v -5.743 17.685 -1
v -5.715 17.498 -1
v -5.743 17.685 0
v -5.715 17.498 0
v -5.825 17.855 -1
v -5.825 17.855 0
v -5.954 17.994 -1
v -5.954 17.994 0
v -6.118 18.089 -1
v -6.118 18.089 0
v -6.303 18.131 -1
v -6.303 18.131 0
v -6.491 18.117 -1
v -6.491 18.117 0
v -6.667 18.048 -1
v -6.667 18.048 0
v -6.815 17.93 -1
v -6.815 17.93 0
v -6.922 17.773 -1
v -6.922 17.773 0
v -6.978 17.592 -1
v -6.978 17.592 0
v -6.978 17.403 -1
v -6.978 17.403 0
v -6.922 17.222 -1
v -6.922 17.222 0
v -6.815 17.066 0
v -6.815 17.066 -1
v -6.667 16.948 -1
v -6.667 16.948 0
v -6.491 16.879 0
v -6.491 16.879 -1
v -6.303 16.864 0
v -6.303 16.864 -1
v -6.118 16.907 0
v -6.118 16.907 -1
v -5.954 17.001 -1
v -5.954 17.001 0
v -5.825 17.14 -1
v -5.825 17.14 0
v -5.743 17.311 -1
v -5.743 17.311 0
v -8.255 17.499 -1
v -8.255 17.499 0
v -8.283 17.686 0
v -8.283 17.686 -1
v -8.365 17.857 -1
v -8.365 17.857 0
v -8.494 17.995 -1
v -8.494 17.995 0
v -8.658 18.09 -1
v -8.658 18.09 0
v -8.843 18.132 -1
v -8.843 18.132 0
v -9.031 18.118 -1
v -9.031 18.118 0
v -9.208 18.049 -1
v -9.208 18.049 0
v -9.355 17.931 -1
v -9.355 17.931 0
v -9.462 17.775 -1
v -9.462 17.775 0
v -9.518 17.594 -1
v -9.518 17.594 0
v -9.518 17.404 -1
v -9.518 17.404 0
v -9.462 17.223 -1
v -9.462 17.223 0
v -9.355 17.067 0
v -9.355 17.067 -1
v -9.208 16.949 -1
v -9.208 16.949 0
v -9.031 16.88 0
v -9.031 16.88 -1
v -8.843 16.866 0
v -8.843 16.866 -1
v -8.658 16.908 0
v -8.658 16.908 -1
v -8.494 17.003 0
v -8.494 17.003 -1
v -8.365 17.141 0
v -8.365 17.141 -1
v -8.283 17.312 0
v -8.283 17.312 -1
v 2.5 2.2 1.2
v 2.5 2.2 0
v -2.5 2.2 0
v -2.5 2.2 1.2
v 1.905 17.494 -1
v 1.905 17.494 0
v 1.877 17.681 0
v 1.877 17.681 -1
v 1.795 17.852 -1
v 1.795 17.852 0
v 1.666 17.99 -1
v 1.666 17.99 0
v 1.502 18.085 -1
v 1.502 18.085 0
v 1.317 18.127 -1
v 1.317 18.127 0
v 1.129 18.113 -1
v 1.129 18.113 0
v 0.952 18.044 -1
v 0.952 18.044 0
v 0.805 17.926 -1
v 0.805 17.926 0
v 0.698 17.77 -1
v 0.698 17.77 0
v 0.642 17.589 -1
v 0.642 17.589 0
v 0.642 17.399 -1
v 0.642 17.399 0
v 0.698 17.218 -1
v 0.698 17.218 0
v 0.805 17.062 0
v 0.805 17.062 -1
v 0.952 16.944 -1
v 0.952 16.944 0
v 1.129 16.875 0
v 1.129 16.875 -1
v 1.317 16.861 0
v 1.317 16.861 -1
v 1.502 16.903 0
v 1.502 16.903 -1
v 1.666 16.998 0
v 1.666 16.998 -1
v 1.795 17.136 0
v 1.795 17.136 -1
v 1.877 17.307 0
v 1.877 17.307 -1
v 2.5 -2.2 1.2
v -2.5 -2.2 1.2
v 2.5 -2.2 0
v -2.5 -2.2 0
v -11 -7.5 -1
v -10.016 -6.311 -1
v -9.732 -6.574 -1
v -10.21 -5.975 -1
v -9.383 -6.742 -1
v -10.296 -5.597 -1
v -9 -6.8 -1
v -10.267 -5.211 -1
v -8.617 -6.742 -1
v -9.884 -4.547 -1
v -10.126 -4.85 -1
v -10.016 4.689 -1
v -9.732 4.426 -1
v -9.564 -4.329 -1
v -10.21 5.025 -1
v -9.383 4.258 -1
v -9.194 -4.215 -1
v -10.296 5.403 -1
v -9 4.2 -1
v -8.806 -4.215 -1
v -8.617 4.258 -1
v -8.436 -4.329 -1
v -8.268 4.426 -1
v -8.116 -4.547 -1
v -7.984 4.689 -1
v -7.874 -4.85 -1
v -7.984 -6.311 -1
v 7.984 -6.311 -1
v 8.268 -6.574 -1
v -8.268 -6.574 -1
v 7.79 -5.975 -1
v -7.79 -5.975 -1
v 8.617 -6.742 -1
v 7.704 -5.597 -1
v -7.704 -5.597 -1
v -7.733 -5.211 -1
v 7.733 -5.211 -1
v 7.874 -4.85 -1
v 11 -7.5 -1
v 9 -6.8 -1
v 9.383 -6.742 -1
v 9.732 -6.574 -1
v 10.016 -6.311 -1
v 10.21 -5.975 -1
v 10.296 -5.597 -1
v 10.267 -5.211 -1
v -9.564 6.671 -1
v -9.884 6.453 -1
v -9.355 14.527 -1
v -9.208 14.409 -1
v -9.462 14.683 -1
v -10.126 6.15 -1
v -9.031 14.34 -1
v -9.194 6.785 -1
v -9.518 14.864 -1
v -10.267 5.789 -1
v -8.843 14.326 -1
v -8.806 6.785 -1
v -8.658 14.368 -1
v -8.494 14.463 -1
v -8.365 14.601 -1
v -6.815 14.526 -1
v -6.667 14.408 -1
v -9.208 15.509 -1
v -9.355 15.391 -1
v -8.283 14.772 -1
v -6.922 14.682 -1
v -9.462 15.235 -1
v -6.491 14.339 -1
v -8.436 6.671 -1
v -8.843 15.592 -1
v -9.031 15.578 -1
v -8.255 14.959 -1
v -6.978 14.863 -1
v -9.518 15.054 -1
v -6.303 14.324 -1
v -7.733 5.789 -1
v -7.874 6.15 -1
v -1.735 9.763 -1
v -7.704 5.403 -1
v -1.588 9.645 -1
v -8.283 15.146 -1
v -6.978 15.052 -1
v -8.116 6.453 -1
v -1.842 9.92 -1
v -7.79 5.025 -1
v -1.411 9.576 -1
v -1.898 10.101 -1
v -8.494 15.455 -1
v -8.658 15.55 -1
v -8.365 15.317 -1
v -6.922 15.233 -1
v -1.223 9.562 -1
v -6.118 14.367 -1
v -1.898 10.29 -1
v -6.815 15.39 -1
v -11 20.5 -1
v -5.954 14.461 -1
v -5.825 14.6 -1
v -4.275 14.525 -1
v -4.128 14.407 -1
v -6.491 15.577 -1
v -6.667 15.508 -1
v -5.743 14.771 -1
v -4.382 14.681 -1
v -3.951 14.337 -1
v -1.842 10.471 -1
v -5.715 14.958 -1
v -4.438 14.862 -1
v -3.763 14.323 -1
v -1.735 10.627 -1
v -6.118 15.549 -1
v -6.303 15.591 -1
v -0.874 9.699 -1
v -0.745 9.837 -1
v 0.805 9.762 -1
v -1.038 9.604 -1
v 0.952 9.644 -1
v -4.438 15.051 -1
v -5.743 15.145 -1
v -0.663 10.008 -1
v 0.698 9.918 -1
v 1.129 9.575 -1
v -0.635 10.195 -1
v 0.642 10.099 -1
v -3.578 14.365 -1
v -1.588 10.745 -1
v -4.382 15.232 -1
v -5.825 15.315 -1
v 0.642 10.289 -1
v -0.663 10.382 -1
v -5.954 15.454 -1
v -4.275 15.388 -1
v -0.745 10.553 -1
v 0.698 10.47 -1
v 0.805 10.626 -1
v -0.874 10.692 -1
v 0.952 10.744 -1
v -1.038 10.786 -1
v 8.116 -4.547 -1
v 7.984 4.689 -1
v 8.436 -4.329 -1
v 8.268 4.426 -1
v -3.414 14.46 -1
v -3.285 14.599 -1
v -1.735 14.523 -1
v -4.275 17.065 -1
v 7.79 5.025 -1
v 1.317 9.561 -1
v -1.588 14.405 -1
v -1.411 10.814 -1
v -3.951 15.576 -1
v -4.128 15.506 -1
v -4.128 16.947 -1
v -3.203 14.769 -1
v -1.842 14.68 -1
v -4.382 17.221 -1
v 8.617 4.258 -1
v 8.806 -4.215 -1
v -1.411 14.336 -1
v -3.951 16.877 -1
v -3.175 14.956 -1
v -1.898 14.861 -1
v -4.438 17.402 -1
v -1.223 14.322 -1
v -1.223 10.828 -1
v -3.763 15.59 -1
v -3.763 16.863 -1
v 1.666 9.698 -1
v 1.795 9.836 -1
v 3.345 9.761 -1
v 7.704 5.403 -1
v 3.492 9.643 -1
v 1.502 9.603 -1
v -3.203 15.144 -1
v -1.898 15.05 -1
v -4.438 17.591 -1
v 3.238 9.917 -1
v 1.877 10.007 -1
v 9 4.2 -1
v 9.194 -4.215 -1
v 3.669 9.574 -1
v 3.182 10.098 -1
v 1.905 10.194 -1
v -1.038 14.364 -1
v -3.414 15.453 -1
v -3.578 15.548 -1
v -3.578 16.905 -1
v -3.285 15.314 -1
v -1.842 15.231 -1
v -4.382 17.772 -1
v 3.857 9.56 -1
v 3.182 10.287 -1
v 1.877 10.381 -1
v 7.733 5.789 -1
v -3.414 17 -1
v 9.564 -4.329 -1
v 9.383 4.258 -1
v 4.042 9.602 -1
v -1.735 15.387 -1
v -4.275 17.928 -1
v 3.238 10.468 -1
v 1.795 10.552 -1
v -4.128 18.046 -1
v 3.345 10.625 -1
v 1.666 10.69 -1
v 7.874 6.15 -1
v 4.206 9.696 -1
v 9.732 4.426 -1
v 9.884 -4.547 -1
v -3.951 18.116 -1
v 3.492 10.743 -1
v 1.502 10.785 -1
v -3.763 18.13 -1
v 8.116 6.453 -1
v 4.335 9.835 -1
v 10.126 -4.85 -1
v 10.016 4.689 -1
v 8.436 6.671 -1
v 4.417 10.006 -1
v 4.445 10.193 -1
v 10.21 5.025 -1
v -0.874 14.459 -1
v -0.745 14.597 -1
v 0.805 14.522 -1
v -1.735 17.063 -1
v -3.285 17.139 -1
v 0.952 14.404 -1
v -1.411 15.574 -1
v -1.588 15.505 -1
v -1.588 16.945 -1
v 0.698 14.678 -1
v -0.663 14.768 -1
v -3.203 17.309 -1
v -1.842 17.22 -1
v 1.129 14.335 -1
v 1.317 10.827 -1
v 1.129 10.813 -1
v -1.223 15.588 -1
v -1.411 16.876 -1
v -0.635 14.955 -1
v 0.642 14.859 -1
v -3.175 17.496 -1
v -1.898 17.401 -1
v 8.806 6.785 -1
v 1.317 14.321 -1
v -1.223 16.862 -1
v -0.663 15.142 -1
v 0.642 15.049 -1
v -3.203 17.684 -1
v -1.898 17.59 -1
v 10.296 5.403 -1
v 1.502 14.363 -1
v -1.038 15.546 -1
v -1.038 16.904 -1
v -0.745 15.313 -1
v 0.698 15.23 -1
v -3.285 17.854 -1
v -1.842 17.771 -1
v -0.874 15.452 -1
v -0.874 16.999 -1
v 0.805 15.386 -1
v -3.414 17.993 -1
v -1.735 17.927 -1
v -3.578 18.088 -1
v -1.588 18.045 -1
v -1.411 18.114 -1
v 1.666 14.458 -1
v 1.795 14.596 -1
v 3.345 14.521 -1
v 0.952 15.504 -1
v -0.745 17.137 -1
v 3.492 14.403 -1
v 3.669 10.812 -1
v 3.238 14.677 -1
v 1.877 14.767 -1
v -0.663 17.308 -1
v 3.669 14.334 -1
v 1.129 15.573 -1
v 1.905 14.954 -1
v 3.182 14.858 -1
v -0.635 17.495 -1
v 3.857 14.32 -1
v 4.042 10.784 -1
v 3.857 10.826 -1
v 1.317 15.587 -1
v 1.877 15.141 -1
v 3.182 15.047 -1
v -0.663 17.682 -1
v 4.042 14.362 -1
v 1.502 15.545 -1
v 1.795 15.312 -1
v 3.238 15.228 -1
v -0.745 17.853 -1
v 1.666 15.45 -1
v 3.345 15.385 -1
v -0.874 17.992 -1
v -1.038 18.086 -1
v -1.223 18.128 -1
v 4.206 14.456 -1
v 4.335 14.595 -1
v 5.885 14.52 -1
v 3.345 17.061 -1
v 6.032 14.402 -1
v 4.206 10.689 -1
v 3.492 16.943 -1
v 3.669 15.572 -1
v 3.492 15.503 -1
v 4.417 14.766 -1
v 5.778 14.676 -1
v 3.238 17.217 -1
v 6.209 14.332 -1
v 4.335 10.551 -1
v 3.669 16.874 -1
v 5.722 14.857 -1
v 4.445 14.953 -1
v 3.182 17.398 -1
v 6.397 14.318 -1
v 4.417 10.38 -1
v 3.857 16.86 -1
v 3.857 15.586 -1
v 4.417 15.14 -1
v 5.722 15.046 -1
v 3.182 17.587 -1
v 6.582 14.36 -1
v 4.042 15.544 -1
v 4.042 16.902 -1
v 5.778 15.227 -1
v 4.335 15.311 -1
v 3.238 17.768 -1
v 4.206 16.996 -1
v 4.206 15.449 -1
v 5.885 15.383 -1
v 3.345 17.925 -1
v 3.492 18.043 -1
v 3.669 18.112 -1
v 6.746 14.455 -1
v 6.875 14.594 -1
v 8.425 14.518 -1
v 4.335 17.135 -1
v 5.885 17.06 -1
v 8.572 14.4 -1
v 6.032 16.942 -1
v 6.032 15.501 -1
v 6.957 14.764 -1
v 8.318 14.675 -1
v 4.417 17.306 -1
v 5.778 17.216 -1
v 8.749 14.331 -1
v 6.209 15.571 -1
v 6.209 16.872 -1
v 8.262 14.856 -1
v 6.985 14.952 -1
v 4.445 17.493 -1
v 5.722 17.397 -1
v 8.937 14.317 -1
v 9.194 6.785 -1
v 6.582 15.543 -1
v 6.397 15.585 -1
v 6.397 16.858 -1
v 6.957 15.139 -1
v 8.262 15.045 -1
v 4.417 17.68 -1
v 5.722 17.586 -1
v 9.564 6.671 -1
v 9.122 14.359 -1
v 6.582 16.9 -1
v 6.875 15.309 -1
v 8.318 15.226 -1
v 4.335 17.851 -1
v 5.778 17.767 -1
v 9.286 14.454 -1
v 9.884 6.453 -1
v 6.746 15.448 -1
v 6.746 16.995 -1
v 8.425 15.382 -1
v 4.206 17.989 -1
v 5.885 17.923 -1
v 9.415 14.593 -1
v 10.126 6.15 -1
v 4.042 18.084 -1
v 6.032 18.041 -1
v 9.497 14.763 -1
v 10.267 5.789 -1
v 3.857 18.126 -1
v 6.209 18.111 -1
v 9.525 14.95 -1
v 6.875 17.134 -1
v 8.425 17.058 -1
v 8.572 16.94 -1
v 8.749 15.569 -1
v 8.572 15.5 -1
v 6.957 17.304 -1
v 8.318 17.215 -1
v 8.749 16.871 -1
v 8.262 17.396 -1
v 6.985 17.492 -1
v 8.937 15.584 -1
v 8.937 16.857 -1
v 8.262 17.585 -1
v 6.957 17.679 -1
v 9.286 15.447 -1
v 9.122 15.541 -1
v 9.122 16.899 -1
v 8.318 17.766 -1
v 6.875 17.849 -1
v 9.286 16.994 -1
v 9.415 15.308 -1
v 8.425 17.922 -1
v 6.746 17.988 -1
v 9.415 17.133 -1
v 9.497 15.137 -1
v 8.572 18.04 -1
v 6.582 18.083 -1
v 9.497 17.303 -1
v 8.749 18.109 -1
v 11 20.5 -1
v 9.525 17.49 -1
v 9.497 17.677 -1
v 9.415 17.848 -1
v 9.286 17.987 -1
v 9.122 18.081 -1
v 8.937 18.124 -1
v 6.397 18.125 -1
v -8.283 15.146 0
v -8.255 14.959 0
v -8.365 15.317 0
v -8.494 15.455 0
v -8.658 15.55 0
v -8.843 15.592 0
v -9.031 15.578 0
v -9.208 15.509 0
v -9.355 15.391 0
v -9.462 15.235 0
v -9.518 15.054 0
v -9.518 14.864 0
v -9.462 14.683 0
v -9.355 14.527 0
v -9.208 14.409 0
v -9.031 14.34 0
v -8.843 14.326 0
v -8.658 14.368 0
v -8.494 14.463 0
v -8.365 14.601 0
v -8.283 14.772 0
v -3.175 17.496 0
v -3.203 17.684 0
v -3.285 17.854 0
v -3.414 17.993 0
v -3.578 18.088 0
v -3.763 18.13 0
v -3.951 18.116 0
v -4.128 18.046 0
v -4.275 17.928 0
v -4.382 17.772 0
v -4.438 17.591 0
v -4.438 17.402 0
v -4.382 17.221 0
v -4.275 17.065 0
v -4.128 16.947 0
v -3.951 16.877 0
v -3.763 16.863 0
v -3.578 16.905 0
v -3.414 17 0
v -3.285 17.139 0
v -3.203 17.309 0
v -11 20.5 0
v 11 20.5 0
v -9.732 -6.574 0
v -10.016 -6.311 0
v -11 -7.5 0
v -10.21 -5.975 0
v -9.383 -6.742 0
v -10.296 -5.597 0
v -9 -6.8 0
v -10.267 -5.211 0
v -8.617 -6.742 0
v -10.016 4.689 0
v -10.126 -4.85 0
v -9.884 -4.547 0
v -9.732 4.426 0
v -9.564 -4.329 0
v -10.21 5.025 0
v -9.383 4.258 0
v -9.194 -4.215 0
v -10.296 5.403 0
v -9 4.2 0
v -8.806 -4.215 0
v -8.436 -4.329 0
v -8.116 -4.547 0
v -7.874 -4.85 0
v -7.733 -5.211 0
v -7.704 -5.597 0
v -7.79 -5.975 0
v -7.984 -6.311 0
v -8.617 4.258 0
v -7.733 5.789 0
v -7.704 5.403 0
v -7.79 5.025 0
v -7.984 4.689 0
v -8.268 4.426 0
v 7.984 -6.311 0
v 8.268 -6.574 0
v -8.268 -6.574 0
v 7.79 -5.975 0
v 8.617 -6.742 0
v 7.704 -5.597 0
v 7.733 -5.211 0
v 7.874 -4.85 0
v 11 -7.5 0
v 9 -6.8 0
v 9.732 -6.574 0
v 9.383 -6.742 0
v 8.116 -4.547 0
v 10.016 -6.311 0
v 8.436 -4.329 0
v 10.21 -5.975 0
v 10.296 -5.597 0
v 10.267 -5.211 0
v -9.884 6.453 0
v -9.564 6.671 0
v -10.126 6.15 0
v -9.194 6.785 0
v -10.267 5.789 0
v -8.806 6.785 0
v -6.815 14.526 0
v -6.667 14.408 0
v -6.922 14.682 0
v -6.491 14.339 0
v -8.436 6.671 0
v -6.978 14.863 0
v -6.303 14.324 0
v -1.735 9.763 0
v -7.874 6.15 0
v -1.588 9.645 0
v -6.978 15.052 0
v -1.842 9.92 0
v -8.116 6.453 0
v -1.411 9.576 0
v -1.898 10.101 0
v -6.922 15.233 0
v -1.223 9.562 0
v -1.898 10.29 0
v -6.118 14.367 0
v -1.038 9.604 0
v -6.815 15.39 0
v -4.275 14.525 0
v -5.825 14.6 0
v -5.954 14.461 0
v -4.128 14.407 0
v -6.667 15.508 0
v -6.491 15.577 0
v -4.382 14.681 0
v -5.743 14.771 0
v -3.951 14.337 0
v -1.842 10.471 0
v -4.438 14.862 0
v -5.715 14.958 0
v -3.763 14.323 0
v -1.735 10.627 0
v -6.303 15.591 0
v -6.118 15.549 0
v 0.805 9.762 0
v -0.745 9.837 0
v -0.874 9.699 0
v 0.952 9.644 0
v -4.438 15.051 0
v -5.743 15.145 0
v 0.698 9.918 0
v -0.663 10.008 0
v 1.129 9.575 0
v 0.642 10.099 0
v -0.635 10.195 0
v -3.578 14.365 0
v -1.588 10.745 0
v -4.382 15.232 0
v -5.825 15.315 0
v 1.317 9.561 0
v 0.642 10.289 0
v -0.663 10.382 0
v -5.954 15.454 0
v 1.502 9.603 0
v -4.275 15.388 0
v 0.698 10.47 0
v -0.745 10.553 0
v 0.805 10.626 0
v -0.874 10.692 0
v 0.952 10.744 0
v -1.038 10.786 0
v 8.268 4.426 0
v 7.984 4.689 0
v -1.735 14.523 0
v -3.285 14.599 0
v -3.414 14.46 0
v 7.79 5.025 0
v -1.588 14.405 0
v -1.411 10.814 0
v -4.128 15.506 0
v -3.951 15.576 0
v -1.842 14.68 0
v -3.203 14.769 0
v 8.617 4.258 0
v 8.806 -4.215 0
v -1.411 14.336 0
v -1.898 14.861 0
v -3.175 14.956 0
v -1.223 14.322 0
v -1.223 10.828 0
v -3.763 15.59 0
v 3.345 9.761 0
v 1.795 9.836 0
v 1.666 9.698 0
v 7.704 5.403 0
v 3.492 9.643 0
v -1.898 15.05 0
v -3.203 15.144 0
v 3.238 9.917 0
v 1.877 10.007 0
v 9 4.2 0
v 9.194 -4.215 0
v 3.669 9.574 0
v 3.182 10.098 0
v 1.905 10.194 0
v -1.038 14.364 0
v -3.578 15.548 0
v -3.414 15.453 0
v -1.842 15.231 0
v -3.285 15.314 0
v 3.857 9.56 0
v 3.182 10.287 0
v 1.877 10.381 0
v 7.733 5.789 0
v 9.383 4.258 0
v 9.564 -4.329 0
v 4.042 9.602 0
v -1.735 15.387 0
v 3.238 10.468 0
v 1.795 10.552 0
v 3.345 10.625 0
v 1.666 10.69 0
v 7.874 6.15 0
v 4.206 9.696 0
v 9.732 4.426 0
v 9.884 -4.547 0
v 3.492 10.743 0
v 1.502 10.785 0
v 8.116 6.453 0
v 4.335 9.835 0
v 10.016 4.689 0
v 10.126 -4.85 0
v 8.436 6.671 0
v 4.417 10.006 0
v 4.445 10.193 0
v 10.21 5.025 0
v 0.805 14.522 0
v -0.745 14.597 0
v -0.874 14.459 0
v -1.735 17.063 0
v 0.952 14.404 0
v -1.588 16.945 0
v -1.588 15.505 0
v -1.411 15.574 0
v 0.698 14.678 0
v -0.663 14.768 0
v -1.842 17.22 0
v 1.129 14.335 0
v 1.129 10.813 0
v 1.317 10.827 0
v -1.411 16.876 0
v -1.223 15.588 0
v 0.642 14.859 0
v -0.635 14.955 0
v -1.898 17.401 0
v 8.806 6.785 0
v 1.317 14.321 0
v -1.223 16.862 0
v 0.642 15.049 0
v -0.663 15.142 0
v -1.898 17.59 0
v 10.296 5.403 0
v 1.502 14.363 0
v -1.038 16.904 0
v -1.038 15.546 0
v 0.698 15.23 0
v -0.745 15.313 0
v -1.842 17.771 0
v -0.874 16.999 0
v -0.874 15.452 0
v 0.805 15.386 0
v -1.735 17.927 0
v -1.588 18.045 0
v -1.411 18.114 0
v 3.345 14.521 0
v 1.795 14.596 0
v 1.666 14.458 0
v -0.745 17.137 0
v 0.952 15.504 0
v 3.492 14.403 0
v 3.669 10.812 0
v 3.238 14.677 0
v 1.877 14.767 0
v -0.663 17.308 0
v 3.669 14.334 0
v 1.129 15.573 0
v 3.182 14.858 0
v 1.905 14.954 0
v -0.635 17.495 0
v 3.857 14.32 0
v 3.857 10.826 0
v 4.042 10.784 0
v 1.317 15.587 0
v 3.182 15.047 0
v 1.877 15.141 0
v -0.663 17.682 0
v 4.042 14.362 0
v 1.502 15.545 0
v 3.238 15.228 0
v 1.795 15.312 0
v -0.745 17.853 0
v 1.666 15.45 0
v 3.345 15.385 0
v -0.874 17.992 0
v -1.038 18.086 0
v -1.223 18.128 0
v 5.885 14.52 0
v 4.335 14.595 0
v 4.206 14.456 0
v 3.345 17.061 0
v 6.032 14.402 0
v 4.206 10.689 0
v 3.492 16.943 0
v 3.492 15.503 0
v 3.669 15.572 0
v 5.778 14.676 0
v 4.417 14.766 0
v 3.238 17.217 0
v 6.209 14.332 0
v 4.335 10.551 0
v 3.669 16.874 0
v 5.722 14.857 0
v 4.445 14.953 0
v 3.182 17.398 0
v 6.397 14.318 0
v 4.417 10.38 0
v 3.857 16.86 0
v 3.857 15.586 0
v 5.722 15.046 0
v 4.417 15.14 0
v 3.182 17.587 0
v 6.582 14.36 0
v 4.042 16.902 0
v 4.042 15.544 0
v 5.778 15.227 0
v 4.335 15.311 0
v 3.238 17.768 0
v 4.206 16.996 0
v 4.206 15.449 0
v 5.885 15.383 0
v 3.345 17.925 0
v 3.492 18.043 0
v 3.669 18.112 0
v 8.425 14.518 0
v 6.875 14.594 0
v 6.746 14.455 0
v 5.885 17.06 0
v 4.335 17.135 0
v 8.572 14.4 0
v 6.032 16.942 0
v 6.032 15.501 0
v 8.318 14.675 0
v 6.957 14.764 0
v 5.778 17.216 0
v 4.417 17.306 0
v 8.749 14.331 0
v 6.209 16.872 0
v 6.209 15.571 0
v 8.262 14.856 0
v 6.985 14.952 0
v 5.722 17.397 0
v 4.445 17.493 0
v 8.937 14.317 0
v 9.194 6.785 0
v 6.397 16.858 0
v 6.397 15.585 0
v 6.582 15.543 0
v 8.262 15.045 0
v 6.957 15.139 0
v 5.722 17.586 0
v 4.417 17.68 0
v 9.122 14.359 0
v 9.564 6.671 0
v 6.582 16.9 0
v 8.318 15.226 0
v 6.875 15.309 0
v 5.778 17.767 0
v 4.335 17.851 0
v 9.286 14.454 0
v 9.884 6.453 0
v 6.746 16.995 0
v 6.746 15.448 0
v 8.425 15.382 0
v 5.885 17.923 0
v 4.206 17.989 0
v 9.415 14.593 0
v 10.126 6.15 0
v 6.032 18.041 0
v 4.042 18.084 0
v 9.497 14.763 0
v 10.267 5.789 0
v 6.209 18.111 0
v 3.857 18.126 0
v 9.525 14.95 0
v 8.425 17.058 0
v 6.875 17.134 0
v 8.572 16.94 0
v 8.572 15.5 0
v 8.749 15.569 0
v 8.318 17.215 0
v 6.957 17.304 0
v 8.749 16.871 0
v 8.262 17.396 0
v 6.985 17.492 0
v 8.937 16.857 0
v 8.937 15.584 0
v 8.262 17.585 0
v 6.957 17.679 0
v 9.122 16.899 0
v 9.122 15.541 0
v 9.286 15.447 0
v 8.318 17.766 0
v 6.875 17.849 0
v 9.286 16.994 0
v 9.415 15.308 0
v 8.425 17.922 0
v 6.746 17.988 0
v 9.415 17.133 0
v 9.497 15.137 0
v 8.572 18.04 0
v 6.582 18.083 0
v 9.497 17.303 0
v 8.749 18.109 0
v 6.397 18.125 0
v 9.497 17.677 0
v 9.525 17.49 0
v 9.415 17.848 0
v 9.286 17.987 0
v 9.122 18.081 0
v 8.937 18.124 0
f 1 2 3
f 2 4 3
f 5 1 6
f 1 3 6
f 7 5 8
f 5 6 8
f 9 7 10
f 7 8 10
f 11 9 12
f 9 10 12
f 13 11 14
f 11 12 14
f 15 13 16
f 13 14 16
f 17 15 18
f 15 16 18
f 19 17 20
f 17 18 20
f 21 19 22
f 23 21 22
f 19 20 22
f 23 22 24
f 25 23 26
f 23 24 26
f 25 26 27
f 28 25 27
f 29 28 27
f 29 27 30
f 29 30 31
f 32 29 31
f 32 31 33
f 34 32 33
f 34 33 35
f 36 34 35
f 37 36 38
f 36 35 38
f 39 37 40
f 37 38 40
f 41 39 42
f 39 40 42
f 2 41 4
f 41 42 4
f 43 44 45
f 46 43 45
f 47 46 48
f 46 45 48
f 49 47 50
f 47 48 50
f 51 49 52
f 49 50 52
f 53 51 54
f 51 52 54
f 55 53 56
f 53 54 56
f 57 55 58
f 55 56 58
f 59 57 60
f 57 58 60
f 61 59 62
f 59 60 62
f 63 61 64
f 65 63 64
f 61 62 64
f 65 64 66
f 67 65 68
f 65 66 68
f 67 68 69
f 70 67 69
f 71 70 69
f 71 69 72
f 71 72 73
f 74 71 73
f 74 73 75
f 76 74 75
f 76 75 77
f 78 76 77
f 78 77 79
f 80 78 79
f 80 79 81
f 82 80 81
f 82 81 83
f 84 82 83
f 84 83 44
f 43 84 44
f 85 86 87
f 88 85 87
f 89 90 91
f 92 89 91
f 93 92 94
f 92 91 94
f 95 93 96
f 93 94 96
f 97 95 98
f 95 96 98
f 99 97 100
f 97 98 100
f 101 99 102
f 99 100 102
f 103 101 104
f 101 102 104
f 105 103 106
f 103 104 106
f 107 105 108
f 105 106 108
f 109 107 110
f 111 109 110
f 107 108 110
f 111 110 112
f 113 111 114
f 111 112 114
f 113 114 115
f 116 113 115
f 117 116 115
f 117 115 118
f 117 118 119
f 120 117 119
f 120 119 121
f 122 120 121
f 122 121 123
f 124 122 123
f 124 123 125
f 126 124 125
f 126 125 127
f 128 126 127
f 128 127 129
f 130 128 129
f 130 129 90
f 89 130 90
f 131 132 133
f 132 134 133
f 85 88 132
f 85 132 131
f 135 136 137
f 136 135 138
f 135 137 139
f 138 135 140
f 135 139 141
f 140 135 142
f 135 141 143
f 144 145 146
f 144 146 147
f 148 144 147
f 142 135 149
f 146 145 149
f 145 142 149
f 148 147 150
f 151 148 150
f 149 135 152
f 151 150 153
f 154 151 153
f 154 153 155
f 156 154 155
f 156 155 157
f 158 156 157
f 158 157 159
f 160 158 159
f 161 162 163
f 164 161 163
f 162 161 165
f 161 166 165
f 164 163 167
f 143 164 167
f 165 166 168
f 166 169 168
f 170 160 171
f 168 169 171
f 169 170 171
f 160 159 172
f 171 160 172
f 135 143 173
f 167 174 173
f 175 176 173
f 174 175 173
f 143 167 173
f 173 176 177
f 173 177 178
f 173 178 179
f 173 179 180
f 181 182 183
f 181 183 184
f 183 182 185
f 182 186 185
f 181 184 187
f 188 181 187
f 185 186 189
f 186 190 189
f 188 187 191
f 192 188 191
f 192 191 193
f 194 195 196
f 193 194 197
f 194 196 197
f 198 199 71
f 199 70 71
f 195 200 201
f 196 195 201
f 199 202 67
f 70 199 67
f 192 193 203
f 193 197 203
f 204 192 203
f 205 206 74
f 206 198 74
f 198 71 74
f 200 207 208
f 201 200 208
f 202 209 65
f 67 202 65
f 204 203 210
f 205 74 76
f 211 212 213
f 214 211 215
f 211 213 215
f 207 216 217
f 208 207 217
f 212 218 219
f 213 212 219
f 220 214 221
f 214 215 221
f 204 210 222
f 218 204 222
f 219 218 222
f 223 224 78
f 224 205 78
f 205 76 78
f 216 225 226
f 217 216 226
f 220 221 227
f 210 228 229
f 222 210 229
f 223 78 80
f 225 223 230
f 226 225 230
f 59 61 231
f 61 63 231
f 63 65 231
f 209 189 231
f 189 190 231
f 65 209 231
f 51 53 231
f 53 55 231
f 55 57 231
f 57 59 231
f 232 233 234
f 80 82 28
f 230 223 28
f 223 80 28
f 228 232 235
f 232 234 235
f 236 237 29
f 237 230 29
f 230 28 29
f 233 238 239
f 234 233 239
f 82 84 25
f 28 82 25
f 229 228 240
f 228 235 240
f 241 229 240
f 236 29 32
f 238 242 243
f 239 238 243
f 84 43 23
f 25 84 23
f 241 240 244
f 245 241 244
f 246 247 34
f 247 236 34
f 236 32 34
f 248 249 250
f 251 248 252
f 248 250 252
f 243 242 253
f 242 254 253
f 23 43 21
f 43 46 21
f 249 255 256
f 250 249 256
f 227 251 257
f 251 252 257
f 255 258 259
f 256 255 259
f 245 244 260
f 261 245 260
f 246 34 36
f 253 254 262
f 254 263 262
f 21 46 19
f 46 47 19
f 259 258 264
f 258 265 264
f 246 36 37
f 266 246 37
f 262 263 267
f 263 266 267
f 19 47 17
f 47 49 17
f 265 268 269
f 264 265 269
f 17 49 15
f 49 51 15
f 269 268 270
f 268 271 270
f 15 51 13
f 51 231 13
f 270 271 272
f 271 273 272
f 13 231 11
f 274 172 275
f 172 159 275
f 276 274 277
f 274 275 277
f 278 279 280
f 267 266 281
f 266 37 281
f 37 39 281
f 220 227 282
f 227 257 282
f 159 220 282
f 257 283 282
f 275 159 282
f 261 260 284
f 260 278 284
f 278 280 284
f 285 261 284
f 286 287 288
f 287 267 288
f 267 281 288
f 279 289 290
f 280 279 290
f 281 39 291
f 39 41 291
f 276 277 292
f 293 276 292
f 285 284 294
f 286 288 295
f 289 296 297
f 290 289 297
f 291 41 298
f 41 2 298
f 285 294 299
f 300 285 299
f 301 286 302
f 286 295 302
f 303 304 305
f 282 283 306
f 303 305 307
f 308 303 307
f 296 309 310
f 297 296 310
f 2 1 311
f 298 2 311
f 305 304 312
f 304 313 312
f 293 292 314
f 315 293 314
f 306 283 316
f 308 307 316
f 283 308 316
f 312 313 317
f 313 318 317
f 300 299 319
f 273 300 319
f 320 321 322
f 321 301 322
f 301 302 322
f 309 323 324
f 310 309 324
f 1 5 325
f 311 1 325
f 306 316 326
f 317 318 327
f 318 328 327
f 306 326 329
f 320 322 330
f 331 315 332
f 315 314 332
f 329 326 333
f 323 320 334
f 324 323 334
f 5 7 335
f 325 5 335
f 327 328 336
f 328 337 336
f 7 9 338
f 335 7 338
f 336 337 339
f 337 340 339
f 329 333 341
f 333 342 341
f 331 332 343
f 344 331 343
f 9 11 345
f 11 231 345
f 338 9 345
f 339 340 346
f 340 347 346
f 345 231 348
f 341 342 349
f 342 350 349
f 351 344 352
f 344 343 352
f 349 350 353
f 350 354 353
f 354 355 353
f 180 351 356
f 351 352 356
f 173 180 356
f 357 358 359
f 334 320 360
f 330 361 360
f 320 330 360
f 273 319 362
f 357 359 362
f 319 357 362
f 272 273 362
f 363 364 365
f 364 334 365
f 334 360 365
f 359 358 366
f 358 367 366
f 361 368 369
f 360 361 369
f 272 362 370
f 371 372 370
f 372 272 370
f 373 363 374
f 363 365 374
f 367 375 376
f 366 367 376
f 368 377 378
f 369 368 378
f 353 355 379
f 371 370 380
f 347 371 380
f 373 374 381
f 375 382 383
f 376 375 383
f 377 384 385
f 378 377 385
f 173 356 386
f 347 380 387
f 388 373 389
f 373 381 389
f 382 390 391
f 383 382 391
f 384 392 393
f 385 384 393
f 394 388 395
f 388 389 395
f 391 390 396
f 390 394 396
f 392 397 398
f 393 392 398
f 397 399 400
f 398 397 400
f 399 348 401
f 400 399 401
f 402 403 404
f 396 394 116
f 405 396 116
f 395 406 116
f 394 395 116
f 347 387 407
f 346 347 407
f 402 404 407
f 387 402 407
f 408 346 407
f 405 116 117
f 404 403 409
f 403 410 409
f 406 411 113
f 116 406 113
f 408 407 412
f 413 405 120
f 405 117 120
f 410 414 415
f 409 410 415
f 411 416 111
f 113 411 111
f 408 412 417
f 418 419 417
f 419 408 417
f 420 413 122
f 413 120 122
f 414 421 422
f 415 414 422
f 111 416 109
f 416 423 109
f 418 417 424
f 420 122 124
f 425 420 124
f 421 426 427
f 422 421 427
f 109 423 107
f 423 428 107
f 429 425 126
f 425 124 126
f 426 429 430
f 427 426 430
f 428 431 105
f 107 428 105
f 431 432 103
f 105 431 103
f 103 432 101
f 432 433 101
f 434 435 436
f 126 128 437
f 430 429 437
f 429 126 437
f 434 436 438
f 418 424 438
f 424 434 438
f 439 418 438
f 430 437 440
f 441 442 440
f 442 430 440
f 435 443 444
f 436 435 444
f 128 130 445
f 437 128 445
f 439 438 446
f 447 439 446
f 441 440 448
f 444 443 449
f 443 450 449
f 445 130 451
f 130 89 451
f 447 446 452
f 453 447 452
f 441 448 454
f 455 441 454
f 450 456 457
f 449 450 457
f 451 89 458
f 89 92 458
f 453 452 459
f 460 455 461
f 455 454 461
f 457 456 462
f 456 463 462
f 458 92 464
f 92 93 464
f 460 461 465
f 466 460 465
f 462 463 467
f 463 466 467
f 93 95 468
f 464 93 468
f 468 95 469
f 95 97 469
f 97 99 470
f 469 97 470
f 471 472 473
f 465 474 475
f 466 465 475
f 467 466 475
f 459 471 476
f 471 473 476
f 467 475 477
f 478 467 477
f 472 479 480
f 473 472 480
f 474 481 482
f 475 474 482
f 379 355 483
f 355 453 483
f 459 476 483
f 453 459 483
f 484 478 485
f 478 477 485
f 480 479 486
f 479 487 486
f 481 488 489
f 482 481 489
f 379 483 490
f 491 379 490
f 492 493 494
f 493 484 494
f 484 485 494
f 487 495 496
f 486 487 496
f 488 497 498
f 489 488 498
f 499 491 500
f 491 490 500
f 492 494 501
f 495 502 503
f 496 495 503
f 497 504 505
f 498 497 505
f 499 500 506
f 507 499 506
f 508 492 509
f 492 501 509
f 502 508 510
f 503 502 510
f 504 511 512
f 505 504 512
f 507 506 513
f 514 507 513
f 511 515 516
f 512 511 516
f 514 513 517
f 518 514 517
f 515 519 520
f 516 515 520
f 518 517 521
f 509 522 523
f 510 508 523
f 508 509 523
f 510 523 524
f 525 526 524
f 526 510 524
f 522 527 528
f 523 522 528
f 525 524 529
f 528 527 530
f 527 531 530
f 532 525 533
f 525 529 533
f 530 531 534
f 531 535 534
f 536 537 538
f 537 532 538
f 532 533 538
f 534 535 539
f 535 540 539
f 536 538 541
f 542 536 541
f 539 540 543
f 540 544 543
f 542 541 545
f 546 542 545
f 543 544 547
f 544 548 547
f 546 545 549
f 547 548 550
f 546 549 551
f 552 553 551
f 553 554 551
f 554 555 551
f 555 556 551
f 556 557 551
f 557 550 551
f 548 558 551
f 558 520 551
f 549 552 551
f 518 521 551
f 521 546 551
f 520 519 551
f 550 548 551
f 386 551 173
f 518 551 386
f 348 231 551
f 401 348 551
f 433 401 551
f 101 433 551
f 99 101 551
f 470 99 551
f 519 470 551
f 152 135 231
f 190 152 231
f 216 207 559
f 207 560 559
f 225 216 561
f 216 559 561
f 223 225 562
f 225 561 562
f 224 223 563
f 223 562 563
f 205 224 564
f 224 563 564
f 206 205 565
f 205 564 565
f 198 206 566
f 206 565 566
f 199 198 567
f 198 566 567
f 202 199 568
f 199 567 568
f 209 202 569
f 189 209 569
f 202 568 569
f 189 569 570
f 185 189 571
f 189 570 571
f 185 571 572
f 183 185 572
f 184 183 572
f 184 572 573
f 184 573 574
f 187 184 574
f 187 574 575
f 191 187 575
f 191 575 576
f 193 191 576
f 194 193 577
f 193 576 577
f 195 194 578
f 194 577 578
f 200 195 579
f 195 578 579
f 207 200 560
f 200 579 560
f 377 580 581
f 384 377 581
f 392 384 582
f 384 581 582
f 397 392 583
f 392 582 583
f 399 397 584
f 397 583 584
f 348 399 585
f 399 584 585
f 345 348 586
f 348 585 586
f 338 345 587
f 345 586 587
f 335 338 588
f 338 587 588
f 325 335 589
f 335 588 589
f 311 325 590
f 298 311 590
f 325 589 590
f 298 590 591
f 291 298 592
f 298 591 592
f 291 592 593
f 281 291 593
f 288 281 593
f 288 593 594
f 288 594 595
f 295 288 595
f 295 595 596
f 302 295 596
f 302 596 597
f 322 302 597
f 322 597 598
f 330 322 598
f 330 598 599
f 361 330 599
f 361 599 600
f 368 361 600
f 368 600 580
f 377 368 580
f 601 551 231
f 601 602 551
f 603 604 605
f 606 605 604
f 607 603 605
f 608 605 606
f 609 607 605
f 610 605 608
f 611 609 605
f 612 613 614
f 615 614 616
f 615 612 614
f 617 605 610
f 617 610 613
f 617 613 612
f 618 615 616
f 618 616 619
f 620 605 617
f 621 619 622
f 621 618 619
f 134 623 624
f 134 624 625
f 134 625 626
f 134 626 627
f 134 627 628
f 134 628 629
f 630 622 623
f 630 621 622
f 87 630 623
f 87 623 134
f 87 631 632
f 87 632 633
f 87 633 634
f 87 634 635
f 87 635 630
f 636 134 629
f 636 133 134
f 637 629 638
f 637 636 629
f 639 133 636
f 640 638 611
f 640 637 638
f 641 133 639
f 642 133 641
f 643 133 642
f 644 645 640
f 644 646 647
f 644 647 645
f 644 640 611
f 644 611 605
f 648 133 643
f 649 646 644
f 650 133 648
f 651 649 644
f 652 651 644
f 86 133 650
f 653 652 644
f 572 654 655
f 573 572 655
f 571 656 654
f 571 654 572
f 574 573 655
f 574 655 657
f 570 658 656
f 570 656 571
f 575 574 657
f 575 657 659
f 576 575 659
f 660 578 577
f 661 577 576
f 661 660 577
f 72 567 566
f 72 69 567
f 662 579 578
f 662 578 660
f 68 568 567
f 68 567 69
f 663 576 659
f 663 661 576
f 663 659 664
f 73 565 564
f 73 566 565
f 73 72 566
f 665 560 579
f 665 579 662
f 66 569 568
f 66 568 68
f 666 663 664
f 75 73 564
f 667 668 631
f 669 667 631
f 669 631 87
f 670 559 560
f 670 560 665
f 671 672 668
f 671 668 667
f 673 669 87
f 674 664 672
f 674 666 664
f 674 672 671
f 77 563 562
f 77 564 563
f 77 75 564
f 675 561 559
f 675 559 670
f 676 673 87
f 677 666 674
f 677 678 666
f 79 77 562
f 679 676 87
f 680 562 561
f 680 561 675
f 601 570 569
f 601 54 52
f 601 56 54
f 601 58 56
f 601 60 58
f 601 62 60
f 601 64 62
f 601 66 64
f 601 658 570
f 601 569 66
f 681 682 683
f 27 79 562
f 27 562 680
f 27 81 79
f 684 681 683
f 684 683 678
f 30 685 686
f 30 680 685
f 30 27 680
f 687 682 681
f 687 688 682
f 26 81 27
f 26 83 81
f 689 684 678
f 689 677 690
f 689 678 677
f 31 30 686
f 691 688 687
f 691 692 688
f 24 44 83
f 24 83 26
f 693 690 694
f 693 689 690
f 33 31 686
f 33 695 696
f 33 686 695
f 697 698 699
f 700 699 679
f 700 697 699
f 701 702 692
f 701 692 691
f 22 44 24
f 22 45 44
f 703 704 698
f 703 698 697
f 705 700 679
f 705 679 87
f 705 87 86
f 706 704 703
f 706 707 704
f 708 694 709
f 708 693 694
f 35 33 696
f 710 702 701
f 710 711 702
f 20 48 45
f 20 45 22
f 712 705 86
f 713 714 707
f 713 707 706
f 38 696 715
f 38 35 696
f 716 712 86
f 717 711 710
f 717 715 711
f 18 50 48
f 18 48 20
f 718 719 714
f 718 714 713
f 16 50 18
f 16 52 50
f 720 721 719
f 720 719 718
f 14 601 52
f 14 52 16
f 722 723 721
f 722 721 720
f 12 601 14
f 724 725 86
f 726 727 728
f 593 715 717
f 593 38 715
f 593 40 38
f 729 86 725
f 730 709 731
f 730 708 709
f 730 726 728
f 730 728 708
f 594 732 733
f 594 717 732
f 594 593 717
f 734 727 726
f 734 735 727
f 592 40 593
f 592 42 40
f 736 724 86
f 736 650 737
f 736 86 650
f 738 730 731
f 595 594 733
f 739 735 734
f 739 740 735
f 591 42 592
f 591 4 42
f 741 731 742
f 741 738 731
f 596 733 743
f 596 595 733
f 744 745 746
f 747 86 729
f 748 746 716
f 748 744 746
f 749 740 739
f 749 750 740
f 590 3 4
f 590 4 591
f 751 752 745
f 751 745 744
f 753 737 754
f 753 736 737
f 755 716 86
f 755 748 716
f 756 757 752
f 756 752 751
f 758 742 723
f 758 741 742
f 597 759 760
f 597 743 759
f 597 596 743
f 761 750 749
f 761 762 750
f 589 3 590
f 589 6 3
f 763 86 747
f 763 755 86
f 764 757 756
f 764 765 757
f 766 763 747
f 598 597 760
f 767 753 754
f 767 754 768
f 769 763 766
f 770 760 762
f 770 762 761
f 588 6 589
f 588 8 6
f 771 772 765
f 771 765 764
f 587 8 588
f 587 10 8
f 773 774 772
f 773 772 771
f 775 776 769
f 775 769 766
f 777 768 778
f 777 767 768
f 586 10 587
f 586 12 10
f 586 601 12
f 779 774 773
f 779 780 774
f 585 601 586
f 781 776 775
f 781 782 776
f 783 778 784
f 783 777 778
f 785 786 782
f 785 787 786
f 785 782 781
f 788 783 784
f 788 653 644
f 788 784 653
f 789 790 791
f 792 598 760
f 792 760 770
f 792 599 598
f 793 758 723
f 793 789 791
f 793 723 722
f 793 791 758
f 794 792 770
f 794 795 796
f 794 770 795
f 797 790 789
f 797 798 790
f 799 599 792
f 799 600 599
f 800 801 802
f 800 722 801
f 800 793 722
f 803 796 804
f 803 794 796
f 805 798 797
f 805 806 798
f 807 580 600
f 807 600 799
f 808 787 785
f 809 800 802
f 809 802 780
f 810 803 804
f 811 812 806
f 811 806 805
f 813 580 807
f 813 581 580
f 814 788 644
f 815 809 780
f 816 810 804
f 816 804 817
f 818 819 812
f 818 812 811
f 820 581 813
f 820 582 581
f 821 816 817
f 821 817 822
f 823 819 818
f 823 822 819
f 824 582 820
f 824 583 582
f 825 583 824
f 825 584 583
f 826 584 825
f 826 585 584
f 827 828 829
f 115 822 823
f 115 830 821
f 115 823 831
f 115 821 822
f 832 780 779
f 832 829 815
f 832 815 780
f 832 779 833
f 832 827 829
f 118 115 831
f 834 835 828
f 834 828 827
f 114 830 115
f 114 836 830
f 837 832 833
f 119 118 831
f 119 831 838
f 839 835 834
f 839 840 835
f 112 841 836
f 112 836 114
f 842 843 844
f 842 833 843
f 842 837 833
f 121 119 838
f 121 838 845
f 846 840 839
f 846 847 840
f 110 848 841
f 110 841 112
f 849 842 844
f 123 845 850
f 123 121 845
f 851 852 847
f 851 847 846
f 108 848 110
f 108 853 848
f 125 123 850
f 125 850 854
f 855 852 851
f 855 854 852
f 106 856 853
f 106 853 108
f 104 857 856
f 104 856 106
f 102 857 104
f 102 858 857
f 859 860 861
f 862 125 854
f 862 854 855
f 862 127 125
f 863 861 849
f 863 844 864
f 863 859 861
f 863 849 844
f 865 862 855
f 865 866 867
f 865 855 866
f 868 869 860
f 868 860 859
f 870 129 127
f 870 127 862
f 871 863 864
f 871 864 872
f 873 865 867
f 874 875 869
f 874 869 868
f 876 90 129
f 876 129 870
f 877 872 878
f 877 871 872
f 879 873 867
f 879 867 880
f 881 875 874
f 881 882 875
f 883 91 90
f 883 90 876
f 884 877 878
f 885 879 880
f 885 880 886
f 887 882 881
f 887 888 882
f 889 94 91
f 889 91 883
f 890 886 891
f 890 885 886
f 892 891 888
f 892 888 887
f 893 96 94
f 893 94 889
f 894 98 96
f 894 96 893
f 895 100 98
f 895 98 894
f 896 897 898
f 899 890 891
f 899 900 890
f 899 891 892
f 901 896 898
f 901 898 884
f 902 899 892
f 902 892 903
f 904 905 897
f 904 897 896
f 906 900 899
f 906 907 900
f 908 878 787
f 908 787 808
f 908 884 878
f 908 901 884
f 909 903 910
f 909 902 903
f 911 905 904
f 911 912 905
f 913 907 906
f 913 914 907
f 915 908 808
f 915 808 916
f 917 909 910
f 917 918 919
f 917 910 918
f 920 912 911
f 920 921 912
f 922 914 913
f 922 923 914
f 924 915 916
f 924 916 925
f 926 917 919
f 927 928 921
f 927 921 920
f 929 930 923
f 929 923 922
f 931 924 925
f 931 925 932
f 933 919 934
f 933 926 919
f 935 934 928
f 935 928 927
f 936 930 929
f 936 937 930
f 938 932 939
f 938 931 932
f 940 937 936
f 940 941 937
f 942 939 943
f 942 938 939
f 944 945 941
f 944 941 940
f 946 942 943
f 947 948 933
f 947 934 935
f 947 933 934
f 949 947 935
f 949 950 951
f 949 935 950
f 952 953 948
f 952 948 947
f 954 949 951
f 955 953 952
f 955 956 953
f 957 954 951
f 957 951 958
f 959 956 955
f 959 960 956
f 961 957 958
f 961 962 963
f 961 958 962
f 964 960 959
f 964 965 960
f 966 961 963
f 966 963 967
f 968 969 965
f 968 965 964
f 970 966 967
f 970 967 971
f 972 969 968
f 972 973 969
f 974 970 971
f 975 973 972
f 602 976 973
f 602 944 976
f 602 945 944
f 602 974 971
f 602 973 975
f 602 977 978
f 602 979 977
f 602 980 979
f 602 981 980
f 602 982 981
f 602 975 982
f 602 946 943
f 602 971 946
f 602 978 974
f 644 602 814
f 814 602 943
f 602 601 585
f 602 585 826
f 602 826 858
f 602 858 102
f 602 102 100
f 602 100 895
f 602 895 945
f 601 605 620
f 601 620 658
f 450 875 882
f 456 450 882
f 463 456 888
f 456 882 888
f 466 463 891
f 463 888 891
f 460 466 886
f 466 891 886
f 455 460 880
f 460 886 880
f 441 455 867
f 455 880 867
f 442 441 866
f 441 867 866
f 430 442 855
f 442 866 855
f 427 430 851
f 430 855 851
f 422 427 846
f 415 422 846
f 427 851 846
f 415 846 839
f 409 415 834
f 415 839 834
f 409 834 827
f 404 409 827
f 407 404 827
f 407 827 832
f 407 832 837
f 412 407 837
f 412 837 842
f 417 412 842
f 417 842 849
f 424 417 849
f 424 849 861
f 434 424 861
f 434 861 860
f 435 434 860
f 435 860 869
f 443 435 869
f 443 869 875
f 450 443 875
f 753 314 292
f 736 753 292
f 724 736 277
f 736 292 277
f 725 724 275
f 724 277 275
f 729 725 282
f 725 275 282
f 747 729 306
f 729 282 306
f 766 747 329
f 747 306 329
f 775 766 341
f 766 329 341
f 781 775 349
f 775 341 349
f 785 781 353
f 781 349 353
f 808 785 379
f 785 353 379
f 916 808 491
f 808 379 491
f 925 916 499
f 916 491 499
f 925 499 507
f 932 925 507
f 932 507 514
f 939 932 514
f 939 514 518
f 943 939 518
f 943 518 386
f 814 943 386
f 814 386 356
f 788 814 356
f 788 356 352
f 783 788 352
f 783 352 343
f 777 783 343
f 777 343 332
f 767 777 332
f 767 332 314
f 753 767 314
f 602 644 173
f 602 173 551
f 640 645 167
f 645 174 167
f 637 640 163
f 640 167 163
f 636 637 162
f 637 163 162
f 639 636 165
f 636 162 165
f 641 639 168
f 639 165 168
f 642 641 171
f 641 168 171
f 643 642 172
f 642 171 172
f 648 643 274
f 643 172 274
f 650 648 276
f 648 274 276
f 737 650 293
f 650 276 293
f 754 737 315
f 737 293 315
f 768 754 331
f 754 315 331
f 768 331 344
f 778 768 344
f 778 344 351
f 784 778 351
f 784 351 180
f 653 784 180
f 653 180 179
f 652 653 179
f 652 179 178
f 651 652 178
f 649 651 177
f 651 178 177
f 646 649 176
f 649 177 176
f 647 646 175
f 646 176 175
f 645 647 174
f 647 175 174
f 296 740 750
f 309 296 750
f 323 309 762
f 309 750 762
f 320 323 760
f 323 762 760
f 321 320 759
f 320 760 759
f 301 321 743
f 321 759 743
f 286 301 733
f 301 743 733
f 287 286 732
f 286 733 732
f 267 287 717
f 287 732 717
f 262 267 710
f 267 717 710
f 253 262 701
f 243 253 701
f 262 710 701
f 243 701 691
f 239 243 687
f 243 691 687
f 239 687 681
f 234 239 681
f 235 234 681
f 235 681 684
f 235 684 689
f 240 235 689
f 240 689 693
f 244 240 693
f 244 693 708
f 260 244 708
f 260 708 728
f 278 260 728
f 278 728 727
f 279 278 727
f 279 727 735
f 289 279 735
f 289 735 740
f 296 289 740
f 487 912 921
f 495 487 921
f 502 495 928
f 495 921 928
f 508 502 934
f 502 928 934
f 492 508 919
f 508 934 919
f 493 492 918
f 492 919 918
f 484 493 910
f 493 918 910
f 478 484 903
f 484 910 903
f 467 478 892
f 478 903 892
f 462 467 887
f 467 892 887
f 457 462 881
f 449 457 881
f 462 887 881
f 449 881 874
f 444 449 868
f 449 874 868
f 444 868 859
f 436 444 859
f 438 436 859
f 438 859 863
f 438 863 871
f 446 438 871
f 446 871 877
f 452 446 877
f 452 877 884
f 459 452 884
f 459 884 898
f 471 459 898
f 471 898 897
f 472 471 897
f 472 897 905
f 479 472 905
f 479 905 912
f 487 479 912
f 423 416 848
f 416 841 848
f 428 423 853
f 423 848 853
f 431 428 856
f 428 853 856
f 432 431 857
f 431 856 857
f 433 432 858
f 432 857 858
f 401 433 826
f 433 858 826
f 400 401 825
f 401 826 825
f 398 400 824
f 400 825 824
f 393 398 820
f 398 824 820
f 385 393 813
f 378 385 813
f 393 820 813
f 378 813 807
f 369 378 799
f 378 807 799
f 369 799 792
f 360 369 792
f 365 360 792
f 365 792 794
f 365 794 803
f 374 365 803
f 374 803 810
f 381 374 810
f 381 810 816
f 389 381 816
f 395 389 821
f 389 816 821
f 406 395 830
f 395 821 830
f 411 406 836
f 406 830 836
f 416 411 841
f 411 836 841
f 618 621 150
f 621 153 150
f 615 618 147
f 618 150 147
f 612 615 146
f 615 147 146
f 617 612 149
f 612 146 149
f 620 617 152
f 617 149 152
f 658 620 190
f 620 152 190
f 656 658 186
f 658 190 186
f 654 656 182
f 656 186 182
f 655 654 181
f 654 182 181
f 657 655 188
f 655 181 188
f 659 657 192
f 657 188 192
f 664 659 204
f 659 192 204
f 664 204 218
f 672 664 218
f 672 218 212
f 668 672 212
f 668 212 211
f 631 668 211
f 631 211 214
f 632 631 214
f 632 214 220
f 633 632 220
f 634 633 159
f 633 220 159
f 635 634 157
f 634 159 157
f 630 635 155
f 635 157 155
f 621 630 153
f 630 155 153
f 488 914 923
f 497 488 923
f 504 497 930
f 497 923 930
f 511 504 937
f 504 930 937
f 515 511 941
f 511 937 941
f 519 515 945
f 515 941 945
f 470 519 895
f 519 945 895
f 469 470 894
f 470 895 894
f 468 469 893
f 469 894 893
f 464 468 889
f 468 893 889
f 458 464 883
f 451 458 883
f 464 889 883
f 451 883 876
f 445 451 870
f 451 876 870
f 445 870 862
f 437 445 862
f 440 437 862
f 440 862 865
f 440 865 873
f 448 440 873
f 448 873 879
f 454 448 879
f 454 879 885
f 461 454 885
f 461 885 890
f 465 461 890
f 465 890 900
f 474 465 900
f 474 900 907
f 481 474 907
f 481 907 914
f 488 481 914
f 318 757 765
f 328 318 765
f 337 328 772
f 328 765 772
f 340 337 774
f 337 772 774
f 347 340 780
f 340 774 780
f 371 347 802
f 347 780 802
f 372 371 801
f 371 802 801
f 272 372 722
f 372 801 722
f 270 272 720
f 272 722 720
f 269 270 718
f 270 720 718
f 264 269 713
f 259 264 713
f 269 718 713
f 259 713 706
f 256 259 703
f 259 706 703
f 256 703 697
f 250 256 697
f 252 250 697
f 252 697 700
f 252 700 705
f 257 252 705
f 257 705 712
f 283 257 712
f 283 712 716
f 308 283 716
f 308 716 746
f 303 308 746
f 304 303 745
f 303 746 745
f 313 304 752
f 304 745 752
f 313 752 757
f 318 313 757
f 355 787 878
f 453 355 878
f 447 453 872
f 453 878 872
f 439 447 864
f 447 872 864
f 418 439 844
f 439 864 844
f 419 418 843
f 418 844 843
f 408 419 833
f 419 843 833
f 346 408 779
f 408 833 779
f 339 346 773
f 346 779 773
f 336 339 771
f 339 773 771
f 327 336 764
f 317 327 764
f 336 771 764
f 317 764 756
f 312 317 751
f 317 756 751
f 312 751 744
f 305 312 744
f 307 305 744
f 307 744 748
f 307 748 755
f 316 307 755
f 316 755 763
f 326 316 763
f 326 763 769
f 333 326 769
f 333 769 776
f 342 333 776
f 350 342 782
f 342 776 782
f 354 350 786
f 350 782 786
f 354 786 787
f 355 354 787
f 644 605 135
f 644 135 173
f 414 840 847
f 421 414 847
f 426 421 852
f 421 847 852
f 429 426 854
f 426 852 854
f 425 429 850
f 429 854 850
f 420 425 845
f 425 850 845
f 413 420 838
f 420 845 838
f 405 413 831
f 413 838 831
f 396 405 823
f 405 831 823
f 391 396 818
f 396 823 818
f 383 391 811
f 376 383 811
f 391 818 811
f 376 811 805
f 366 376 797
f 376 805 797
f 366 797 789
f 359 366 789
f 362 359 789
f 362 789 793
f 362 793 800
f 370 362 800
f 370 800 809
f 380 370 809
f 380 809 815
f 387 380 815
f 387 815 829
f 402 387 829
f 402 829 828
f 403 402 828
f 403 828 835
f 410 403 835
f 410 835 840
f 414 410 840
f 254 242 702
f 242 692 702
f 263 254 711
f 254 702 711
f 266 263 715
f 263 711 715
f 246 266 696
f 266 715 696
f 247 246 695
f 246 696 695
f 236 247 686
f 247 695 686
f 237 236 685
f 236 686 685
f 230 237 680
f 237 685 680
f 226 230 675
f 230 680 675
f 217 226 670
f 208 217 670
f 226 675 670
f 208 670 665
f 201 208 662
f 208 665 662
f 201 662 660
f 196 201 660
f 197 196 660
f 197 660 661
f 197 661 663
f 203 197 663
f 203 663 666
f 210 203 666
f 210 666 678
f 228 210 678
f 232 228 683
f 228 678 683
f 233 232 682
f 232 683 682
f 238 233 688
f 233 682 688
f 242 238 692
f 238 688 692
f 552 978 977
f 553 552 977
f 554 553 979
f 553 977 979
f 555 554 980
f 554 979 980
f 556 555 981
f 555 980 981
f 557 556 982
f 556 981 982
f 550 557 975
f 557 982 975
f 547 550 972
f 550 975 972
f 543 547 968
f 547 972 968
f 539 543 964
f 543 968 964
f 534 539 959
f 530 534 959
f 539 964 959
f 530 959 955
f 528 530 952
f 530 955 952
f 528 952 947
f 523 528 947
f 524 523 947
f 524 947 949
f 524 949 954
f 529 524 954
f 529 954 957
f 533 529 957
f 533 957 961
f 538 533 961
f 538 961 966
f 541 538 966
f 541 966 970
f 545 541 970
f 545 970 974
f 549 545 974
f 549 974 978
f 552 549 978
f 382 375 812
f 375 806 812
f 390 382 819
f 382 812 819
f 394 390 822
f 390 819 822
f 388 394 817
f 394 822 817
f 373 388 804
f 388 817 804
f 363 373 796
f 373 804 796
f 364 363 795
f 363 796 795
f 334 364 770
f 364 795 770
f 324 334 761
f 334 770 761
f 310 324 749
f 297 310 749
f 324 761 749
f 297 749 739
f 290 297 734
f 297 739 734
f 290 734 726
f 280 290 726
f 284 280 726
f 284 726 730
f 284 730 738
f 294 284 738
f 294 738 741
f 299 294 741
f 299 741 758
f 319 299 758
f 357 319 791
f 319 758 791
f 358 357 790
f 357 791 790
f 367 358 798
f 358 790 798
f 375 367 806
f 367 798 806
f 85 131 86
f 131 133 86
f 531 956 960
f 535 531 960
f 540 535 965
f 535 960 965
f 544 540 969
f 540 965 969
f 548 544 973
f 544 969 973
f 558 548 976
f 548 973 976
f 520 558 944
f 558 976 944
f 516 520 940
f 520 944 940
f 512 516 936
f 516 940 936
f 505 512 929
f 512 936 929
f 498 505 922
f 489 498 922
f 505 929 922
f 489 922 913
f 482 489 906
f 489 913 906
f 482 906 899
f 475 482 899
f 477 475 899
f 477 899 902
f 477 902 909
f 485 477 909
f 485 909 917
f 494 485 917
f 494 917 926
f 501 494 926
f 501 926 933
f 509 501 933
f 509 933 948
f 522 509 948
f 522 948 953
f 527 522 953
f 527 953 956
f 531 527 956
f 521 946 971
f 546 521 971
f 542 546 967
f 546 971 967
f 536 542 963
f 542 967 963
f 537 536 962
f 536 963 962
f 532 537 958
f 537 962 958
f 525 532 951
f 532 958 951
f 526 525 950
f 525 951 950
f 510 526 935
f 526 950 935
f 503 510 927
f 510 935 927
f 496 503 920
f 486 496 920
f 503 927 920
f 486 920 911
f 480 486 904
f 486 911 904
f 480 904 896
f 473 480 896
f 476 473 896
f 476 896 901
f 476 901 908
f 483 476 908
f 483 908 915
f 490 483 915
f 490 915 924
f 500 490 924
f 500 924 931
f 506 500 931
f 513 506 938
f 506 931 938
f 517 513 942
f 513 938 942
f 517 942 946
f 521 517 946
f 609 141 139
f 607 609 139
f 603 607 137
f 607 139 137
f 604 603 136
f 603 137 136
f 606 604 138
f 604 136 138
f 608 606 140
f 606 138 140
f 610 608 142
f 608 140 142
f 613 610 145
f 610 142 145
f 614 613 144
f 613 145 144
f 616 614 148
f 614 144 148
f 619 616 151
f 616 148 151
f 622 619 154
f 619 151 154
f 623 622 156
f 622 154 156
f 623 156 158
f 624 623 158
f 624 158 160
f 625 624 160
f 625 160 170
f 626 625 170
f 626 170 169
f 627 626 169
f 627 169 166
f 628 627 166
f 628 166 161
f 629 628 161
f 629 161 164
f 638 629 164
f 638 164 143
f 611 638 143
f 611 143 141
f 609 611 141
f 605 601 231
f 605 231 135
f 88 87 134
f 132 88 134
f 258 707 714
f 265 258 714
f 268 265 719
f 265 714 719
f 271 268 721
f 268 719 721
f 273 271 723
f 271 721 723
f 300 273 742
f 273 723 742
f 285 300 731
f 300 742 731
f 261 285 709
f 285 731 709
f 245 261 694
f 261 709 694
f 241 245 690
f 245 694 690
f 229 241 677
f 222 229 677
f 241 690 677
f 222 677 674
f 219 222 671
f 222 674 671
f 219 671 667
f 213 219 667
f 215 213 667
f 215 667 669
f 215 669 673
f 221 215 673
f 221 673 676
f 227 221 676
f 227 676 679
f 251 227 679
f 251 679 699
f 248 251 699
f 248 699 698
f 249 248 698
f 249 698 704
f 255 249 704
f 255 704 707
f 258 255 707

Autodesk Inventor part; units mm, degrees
ref_plane "YZ Plane" through (0, 0, 0) normal (1, 0, 0) x (0, 1, 0)
ref_plane "XZ Plane" through (0, 0, 0) normal (0, 1, 0) x (-1, 0, 0)
ref_plane "XY Plane" through (0, 0, 0) normal (0, 0, 1) x (1, 0, 0)
sketch "スケッチ1" plane through (0, 0, 0) normal (0, 0, 1) x (1, 0, 0)
  line L0 (-11, -7.5) -> (11, -7.5)
  line L1 (11, -7.5) -> (11, 20.5)
  line L2 (11, 20.5) -> (-11, 20.5)
  line L3 (-11, 20.5) -> (-11, -7.5)
  line L4 (-11, -7.5) -> (11, 20.5) construction
  line L5 (11, -7.5) -> (-11, 20.5) construction
  line L6 (-9, -5.5) -> (9, -5.5) construction
  line L7 (9, -5.5) -> (9, 5.5) construction
  line L8 (9, 5.5) -> (-9, 5.5) construction
  line L9 (-9, 5.5) -> (-9, -5.5) construction
  line L10 (-9, -5.5) -> (9, 5.5) construction
  line L11 (9, -5.5) -> (-9, 5.5) construction
  point P0 (0, 0)
  point P1 (0, 6.5)
  point P2 (0, 6.5)
  point P3 (0, 0)
  point P4 (0, 0)
  point P5 (0, 0)
  dimension "d0" = 22
  dimension "d1" = 28
  dimension "d2" = 18
  dimension "d3" = 11
  dimension "d4" = 2
extrude "押し出し1" add sketch "スケッチ1" against normal blind 1
sketch "スケッチ2" plane through (0, 0, 0) normal (0, 0, 1) x (1, 0, 0)
  line L0 (-9, -5.5) -> (9, -5.5)
  line L1 (9, -5.5) -> (9, 5.5)
  line L2 (9, 5.5) -> (-9, 5.5)
  line L3 (-9, 5.5) -> (-9, -5.5)
  line L4 (-9, -5.5) -> (9, 5.5) construction
  line L5 (9, -5.5) -> (-9, 5.5) construction
  point P0 (0, 0)
  dimension "d7" = 11
  dimension "d8" = 18
hole "穴1" at (-9, 5.5, 0) at (-9, -5.5, 0) at (9, 5.5, 0) at (9, -5.5, 0) direction (0, 0, -1) diameter 2.6 end through all
sketch "スケッチ3" plane through (0, 0, 0) normal (0, 0, 1) x (1, 0, 0)
  line L0 (-2.5, -2.2) -> (2.5, -2.2)
  line L1 (2.5, -2.2) -> (2.5, 2.2)
  line L2 (2.5, 2.2) -> (-2.5, 2.2)
  line L3 (-2.5, 2.2) -> (-2.5, -2.2)
  line L4 (-2.5, -2.2) -> (2.5, 2.2) construction
  line L5 (2.5, -2.2) -> (-2.5, 2.2) construction
  point P0 (0, 0)
  dimension "d16" = 4.4
  dimension "d17" = 5
extrude "押し出し2" add sketch "スケッチ3" along normal blind 1.2
sketch "スケッチ4" plane through (0, 0, 0) normal (0, 0, 1) x (1, 0, 0)
  line L0 (-11, 20.5) -> (-11, -7.5) projected
  line L1 (-11, 20.5) -> (11.0137, 20.4892) construction
  line L2 (11.0137, 20.4892) -> (11, -7.5) construction
  line L3 (11, -7.5) -> (-11.0137, -7.4892) construction
  line L4 (-11.0137, -7.4892) -> (-11, 20.5) construction
  line L5 (11, -7.5) -> (11, 20.5) projected
  line L6 (-11, -7.5) -> (11, -7.5) projected
  circle A0 centre (-1.27, 17.4952) radius 0.635
  circle A1 centre (1.27, 17.494) radius 0.635
  circle A2 centre (-1.27, 14.9552) radius 0.635
  circle A3 centre (1.27, 14.954) radius 0.635
  circle A4 centre (-3.81, 14.9565) radius 0.635
  circle A5 centre (-3.81, 17.4965) radius 0.635
  circle A6 centre (-6.35, 14.9577) radius 0.635
  circle A7 centre (-6.35, 17.4977) radius 0.635
  circle A8 centre (-8.89, 14.959) radius 0.635
  circle A9 centre (-8.89, 17.499) radius 0.635
  circle A10 centre (3.81, 17.4928) radius 0.635
  circle A11 centre (3.81, 14.9528) radius 0.635
  circle A12 centre (6.35, 17.4915) radius 0.635
  circle A13 centre (6.35, 14.9515) radius 0.635
  circle A14 centre (8.89, 17.4903) radius 0.635
  circle A15 centre (8.89, 14.9503) radius 0.635
  circle A16 centre (-1.27, 10.1952) radius 0.635
  circle A17 centre (1.27, 10.194) radius 0.635
  circle A18 centre (3.81, 10.1928) radius 0.635
  point P0 (0, 0)
  dimension "d25" = 3
  dimension "d30" = 2.54
  dimension "d32" = 1.27
  dimension "d37" = 1.27
  dimension "d38" = 1.27
  dimension "d39" = 3
  dimension "d41" = 2.54
  dimension "d43" = 2.54
  dimension "d45" = 1.27
  dimension "d46" = 1.27
  dimension "d53" = 2.54
  dimension "d63" = 2.54
  dimension "d71" = 1.27
  dimension "d73" = 10.3
  dimension "d78" = 2.54
extrude "押し出し3" cut sketch "スケッチ4" against normal through all
equation "\"d45\" = d37"
equation "\"d46\" = d45"
equation "\"d71\" = d45"
properties part number "AS5047P-TS_EK_AB" material "ABS プラスチック"
